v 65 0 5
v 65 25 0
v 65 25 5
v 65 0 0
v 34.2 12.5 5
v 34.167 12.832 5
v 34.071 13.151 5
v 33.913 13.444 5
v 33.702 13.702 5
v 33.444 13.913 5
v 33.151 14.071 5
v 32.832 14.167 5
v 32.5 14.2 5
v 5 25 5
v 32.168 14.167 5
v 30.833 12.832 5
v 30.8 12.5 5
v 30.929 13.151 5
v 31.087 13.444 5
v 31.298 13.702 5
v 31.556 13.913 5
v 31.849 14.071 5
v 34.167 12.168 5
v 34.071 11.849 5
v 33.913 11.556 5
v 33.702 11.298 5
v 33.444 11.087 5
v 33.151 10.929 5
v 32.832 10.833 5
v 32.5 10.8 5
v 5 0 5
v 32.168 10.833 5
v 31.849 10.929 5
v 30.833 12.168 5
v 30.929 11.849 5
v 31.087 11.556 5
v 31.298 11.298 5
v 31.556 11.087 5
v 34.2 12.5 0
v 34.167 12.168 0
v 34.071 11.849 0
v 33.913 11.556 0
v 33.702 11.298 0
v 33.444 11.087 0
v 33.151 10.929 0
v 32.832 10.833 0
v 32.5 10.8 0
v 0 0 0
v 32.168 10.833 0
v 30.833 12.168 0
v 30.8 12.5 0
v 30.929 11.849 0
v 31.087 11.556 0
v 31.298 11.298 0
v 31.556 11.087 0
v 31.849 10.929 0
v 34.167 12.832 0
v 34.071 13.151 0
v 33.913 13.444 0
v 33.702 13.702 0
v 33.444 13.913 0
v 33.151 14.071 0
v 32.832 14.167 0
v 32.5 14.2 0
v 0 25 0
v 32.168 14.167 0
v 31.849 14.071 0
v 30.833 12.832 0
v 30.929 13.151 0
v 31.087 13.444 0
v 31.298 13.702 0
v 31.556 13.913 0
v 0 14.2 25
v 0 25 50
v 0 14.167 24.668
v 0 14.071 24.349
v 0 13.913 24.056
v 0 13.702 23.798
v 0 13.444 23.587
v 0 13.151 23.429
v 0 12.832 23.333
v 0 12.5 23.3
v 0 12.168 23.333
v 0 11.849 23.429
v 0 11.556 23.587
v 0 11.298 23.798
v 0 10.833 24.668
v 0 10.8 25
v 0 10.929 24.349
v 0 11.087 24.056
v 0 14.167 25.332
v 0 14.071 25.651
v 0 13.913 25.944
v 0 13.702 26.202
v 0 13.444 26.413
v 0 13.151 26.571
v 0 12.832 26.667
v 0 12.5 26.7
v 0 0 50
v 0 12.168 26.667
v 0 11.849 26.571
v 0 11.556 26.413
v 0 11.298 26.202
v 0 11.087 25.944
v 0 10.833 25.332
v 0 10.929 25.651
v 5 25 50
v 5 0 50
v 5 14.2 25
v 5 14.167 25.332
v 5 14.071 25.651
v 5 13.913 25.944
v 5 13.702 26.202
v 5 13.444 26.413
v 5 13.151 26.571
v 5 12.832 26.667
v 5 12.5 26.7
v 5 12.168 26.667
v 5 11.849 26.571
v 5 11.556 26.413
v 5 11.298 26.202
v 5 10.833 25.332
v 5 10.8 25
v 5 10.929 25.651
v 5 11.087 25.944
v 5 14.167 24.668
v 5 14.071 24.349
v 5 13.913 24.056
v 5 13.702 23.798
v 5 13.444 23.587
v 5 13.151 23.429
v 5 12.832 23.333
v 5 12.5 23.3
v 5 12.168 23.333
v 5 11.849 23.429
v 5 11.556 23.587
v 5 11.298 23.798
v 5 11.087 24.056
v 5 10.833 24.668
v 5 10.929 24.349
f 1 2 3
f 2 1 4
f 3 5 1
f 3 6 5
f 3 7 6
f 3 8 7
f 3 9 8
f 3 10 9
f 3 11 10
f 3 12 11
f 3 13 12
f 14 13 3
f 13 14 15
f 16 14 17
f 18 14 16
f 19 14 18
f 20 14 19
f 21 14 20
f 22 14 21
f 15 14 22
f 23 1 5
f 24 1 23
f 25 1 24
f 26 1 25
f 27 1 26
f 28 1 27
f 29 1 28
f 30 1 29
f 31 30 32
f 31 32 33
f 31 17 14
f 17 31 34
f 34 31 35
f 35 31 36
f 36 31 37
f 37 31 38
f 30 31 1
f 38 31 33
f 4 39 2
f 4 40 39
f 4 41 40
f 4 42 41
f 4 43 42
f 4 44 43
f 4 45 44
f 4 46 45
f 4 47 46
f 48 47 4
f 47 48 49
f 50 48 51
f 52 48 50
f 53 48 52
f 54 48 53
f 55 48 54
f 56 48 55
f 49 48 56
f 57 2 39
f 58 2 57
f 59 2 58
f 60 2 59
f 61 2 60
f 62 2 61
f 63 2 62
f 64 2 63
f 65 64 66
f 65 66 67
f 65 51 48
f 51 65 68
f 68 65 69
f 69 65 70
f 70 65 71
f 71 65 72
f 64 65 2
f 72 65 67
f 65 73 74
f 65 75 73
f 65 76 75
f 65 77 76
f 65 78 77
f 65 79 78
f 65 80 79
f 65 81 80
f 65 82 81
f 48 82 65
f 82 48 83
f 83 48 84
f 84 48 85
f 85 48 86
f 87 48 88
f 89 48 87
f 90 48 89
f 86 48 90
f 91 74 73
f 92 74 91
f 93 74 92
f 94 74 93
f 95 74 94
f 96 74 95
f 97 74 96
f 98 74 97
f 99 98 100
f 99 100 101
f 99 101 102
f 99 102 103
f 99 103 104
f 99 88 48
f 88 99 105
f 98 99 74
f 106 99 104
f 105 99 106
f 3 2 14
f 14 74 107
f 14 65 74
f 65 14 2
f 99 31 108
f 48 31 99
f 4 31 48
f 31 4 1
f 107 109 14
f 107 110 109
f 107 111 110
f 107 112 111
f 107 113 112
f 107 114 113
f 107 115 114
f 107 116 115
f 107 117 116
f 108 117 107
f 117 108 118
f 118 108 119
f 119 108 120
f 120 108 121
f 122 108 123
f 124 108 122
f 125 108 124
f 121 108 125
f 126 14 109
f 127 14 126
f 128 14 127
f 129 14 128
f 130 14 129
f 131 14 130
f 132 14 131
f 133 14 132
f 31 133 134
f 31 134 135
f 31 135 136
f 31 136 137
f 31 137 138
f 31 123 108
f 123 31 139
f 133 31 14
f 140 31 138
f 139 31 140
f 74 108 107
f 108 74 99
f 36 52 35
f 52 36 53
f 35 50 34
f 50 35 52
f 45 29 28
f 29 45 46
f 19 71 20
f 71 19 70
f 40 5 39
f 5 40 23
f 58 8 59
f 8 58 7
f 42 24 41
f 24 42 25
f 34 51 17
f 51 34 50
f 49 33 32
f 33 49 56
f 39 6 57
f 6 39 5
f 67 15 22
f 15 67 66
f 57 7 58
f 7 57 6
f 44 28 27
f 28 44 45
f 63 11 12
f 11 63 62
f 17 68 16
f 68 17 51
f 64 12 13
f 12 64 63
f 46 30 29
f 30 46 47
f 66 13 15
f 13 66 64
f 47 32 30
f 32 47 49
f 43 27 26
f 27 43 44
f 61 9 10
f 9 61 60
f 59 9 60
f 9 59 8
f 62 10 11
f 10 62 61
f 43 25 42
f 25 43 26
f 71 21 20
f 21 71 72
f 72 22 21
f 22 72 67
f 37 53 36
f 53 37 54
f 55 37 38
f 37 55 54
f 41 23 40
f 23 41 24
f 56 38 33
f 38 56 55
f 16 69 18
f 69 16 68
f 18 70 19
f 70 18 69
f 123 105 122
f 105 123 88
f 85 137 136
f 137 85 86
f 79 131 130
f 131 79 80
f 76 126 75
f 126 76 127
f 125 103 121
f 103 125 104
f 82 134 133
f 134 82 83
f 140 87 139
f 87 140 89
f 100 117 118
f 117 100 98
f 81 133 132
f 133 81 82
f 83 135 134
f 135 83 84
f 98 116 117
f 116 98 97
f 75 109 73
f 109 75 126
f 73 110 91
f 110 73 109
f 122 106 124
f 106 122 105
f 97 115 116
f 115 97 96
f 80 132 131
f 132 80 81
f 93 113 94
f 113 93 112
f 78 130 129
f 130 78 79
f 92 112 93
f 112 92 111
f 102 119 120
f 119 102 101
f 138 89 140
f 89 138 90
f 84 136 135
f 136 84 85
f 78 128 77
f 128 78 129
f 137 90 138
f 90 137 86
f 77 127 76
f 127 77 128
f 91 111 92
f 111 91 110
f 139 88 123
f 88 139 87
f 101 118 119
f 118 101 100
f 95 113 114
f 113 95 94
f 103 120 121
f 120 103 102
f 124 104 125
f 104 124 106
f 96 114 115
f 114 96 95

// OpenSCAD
$fn = 32;

// ----------------------------------------------------------------------
// L-bracket: 65 x 25 x 50 mm
// ----------------------------------------------------------------------

// --- parameters (mm) ---
leg_a = 65;               // horizontal leg, X
leg_b = 50;               // vertical leg, Z
depth = 25;               // bracket depth, Y
thick = 5;                // plate thickness
hole_d = 3.4;             // clearance for M3

module hole_z(px, py) {
  translate([px, py, -0.5]) cylinder(h = thick + 1, d = hole_d);
}
module hole_x(pz, py) {
  translate([-0.5, py, pz]) rotate([0, 90, 0]) cylinder(h = thick + 1, d = hole_d);
}

difference() {
  union() {
    /* horizontal leg */
    cube([leg_a, depth, thick]);
    /* vertical leg, overlapping the corner block */
    cube([thick, depth, leg_b]);
  }
  hole_z(32.5, 12.5);
  hole_x(25, 12.5);
}
